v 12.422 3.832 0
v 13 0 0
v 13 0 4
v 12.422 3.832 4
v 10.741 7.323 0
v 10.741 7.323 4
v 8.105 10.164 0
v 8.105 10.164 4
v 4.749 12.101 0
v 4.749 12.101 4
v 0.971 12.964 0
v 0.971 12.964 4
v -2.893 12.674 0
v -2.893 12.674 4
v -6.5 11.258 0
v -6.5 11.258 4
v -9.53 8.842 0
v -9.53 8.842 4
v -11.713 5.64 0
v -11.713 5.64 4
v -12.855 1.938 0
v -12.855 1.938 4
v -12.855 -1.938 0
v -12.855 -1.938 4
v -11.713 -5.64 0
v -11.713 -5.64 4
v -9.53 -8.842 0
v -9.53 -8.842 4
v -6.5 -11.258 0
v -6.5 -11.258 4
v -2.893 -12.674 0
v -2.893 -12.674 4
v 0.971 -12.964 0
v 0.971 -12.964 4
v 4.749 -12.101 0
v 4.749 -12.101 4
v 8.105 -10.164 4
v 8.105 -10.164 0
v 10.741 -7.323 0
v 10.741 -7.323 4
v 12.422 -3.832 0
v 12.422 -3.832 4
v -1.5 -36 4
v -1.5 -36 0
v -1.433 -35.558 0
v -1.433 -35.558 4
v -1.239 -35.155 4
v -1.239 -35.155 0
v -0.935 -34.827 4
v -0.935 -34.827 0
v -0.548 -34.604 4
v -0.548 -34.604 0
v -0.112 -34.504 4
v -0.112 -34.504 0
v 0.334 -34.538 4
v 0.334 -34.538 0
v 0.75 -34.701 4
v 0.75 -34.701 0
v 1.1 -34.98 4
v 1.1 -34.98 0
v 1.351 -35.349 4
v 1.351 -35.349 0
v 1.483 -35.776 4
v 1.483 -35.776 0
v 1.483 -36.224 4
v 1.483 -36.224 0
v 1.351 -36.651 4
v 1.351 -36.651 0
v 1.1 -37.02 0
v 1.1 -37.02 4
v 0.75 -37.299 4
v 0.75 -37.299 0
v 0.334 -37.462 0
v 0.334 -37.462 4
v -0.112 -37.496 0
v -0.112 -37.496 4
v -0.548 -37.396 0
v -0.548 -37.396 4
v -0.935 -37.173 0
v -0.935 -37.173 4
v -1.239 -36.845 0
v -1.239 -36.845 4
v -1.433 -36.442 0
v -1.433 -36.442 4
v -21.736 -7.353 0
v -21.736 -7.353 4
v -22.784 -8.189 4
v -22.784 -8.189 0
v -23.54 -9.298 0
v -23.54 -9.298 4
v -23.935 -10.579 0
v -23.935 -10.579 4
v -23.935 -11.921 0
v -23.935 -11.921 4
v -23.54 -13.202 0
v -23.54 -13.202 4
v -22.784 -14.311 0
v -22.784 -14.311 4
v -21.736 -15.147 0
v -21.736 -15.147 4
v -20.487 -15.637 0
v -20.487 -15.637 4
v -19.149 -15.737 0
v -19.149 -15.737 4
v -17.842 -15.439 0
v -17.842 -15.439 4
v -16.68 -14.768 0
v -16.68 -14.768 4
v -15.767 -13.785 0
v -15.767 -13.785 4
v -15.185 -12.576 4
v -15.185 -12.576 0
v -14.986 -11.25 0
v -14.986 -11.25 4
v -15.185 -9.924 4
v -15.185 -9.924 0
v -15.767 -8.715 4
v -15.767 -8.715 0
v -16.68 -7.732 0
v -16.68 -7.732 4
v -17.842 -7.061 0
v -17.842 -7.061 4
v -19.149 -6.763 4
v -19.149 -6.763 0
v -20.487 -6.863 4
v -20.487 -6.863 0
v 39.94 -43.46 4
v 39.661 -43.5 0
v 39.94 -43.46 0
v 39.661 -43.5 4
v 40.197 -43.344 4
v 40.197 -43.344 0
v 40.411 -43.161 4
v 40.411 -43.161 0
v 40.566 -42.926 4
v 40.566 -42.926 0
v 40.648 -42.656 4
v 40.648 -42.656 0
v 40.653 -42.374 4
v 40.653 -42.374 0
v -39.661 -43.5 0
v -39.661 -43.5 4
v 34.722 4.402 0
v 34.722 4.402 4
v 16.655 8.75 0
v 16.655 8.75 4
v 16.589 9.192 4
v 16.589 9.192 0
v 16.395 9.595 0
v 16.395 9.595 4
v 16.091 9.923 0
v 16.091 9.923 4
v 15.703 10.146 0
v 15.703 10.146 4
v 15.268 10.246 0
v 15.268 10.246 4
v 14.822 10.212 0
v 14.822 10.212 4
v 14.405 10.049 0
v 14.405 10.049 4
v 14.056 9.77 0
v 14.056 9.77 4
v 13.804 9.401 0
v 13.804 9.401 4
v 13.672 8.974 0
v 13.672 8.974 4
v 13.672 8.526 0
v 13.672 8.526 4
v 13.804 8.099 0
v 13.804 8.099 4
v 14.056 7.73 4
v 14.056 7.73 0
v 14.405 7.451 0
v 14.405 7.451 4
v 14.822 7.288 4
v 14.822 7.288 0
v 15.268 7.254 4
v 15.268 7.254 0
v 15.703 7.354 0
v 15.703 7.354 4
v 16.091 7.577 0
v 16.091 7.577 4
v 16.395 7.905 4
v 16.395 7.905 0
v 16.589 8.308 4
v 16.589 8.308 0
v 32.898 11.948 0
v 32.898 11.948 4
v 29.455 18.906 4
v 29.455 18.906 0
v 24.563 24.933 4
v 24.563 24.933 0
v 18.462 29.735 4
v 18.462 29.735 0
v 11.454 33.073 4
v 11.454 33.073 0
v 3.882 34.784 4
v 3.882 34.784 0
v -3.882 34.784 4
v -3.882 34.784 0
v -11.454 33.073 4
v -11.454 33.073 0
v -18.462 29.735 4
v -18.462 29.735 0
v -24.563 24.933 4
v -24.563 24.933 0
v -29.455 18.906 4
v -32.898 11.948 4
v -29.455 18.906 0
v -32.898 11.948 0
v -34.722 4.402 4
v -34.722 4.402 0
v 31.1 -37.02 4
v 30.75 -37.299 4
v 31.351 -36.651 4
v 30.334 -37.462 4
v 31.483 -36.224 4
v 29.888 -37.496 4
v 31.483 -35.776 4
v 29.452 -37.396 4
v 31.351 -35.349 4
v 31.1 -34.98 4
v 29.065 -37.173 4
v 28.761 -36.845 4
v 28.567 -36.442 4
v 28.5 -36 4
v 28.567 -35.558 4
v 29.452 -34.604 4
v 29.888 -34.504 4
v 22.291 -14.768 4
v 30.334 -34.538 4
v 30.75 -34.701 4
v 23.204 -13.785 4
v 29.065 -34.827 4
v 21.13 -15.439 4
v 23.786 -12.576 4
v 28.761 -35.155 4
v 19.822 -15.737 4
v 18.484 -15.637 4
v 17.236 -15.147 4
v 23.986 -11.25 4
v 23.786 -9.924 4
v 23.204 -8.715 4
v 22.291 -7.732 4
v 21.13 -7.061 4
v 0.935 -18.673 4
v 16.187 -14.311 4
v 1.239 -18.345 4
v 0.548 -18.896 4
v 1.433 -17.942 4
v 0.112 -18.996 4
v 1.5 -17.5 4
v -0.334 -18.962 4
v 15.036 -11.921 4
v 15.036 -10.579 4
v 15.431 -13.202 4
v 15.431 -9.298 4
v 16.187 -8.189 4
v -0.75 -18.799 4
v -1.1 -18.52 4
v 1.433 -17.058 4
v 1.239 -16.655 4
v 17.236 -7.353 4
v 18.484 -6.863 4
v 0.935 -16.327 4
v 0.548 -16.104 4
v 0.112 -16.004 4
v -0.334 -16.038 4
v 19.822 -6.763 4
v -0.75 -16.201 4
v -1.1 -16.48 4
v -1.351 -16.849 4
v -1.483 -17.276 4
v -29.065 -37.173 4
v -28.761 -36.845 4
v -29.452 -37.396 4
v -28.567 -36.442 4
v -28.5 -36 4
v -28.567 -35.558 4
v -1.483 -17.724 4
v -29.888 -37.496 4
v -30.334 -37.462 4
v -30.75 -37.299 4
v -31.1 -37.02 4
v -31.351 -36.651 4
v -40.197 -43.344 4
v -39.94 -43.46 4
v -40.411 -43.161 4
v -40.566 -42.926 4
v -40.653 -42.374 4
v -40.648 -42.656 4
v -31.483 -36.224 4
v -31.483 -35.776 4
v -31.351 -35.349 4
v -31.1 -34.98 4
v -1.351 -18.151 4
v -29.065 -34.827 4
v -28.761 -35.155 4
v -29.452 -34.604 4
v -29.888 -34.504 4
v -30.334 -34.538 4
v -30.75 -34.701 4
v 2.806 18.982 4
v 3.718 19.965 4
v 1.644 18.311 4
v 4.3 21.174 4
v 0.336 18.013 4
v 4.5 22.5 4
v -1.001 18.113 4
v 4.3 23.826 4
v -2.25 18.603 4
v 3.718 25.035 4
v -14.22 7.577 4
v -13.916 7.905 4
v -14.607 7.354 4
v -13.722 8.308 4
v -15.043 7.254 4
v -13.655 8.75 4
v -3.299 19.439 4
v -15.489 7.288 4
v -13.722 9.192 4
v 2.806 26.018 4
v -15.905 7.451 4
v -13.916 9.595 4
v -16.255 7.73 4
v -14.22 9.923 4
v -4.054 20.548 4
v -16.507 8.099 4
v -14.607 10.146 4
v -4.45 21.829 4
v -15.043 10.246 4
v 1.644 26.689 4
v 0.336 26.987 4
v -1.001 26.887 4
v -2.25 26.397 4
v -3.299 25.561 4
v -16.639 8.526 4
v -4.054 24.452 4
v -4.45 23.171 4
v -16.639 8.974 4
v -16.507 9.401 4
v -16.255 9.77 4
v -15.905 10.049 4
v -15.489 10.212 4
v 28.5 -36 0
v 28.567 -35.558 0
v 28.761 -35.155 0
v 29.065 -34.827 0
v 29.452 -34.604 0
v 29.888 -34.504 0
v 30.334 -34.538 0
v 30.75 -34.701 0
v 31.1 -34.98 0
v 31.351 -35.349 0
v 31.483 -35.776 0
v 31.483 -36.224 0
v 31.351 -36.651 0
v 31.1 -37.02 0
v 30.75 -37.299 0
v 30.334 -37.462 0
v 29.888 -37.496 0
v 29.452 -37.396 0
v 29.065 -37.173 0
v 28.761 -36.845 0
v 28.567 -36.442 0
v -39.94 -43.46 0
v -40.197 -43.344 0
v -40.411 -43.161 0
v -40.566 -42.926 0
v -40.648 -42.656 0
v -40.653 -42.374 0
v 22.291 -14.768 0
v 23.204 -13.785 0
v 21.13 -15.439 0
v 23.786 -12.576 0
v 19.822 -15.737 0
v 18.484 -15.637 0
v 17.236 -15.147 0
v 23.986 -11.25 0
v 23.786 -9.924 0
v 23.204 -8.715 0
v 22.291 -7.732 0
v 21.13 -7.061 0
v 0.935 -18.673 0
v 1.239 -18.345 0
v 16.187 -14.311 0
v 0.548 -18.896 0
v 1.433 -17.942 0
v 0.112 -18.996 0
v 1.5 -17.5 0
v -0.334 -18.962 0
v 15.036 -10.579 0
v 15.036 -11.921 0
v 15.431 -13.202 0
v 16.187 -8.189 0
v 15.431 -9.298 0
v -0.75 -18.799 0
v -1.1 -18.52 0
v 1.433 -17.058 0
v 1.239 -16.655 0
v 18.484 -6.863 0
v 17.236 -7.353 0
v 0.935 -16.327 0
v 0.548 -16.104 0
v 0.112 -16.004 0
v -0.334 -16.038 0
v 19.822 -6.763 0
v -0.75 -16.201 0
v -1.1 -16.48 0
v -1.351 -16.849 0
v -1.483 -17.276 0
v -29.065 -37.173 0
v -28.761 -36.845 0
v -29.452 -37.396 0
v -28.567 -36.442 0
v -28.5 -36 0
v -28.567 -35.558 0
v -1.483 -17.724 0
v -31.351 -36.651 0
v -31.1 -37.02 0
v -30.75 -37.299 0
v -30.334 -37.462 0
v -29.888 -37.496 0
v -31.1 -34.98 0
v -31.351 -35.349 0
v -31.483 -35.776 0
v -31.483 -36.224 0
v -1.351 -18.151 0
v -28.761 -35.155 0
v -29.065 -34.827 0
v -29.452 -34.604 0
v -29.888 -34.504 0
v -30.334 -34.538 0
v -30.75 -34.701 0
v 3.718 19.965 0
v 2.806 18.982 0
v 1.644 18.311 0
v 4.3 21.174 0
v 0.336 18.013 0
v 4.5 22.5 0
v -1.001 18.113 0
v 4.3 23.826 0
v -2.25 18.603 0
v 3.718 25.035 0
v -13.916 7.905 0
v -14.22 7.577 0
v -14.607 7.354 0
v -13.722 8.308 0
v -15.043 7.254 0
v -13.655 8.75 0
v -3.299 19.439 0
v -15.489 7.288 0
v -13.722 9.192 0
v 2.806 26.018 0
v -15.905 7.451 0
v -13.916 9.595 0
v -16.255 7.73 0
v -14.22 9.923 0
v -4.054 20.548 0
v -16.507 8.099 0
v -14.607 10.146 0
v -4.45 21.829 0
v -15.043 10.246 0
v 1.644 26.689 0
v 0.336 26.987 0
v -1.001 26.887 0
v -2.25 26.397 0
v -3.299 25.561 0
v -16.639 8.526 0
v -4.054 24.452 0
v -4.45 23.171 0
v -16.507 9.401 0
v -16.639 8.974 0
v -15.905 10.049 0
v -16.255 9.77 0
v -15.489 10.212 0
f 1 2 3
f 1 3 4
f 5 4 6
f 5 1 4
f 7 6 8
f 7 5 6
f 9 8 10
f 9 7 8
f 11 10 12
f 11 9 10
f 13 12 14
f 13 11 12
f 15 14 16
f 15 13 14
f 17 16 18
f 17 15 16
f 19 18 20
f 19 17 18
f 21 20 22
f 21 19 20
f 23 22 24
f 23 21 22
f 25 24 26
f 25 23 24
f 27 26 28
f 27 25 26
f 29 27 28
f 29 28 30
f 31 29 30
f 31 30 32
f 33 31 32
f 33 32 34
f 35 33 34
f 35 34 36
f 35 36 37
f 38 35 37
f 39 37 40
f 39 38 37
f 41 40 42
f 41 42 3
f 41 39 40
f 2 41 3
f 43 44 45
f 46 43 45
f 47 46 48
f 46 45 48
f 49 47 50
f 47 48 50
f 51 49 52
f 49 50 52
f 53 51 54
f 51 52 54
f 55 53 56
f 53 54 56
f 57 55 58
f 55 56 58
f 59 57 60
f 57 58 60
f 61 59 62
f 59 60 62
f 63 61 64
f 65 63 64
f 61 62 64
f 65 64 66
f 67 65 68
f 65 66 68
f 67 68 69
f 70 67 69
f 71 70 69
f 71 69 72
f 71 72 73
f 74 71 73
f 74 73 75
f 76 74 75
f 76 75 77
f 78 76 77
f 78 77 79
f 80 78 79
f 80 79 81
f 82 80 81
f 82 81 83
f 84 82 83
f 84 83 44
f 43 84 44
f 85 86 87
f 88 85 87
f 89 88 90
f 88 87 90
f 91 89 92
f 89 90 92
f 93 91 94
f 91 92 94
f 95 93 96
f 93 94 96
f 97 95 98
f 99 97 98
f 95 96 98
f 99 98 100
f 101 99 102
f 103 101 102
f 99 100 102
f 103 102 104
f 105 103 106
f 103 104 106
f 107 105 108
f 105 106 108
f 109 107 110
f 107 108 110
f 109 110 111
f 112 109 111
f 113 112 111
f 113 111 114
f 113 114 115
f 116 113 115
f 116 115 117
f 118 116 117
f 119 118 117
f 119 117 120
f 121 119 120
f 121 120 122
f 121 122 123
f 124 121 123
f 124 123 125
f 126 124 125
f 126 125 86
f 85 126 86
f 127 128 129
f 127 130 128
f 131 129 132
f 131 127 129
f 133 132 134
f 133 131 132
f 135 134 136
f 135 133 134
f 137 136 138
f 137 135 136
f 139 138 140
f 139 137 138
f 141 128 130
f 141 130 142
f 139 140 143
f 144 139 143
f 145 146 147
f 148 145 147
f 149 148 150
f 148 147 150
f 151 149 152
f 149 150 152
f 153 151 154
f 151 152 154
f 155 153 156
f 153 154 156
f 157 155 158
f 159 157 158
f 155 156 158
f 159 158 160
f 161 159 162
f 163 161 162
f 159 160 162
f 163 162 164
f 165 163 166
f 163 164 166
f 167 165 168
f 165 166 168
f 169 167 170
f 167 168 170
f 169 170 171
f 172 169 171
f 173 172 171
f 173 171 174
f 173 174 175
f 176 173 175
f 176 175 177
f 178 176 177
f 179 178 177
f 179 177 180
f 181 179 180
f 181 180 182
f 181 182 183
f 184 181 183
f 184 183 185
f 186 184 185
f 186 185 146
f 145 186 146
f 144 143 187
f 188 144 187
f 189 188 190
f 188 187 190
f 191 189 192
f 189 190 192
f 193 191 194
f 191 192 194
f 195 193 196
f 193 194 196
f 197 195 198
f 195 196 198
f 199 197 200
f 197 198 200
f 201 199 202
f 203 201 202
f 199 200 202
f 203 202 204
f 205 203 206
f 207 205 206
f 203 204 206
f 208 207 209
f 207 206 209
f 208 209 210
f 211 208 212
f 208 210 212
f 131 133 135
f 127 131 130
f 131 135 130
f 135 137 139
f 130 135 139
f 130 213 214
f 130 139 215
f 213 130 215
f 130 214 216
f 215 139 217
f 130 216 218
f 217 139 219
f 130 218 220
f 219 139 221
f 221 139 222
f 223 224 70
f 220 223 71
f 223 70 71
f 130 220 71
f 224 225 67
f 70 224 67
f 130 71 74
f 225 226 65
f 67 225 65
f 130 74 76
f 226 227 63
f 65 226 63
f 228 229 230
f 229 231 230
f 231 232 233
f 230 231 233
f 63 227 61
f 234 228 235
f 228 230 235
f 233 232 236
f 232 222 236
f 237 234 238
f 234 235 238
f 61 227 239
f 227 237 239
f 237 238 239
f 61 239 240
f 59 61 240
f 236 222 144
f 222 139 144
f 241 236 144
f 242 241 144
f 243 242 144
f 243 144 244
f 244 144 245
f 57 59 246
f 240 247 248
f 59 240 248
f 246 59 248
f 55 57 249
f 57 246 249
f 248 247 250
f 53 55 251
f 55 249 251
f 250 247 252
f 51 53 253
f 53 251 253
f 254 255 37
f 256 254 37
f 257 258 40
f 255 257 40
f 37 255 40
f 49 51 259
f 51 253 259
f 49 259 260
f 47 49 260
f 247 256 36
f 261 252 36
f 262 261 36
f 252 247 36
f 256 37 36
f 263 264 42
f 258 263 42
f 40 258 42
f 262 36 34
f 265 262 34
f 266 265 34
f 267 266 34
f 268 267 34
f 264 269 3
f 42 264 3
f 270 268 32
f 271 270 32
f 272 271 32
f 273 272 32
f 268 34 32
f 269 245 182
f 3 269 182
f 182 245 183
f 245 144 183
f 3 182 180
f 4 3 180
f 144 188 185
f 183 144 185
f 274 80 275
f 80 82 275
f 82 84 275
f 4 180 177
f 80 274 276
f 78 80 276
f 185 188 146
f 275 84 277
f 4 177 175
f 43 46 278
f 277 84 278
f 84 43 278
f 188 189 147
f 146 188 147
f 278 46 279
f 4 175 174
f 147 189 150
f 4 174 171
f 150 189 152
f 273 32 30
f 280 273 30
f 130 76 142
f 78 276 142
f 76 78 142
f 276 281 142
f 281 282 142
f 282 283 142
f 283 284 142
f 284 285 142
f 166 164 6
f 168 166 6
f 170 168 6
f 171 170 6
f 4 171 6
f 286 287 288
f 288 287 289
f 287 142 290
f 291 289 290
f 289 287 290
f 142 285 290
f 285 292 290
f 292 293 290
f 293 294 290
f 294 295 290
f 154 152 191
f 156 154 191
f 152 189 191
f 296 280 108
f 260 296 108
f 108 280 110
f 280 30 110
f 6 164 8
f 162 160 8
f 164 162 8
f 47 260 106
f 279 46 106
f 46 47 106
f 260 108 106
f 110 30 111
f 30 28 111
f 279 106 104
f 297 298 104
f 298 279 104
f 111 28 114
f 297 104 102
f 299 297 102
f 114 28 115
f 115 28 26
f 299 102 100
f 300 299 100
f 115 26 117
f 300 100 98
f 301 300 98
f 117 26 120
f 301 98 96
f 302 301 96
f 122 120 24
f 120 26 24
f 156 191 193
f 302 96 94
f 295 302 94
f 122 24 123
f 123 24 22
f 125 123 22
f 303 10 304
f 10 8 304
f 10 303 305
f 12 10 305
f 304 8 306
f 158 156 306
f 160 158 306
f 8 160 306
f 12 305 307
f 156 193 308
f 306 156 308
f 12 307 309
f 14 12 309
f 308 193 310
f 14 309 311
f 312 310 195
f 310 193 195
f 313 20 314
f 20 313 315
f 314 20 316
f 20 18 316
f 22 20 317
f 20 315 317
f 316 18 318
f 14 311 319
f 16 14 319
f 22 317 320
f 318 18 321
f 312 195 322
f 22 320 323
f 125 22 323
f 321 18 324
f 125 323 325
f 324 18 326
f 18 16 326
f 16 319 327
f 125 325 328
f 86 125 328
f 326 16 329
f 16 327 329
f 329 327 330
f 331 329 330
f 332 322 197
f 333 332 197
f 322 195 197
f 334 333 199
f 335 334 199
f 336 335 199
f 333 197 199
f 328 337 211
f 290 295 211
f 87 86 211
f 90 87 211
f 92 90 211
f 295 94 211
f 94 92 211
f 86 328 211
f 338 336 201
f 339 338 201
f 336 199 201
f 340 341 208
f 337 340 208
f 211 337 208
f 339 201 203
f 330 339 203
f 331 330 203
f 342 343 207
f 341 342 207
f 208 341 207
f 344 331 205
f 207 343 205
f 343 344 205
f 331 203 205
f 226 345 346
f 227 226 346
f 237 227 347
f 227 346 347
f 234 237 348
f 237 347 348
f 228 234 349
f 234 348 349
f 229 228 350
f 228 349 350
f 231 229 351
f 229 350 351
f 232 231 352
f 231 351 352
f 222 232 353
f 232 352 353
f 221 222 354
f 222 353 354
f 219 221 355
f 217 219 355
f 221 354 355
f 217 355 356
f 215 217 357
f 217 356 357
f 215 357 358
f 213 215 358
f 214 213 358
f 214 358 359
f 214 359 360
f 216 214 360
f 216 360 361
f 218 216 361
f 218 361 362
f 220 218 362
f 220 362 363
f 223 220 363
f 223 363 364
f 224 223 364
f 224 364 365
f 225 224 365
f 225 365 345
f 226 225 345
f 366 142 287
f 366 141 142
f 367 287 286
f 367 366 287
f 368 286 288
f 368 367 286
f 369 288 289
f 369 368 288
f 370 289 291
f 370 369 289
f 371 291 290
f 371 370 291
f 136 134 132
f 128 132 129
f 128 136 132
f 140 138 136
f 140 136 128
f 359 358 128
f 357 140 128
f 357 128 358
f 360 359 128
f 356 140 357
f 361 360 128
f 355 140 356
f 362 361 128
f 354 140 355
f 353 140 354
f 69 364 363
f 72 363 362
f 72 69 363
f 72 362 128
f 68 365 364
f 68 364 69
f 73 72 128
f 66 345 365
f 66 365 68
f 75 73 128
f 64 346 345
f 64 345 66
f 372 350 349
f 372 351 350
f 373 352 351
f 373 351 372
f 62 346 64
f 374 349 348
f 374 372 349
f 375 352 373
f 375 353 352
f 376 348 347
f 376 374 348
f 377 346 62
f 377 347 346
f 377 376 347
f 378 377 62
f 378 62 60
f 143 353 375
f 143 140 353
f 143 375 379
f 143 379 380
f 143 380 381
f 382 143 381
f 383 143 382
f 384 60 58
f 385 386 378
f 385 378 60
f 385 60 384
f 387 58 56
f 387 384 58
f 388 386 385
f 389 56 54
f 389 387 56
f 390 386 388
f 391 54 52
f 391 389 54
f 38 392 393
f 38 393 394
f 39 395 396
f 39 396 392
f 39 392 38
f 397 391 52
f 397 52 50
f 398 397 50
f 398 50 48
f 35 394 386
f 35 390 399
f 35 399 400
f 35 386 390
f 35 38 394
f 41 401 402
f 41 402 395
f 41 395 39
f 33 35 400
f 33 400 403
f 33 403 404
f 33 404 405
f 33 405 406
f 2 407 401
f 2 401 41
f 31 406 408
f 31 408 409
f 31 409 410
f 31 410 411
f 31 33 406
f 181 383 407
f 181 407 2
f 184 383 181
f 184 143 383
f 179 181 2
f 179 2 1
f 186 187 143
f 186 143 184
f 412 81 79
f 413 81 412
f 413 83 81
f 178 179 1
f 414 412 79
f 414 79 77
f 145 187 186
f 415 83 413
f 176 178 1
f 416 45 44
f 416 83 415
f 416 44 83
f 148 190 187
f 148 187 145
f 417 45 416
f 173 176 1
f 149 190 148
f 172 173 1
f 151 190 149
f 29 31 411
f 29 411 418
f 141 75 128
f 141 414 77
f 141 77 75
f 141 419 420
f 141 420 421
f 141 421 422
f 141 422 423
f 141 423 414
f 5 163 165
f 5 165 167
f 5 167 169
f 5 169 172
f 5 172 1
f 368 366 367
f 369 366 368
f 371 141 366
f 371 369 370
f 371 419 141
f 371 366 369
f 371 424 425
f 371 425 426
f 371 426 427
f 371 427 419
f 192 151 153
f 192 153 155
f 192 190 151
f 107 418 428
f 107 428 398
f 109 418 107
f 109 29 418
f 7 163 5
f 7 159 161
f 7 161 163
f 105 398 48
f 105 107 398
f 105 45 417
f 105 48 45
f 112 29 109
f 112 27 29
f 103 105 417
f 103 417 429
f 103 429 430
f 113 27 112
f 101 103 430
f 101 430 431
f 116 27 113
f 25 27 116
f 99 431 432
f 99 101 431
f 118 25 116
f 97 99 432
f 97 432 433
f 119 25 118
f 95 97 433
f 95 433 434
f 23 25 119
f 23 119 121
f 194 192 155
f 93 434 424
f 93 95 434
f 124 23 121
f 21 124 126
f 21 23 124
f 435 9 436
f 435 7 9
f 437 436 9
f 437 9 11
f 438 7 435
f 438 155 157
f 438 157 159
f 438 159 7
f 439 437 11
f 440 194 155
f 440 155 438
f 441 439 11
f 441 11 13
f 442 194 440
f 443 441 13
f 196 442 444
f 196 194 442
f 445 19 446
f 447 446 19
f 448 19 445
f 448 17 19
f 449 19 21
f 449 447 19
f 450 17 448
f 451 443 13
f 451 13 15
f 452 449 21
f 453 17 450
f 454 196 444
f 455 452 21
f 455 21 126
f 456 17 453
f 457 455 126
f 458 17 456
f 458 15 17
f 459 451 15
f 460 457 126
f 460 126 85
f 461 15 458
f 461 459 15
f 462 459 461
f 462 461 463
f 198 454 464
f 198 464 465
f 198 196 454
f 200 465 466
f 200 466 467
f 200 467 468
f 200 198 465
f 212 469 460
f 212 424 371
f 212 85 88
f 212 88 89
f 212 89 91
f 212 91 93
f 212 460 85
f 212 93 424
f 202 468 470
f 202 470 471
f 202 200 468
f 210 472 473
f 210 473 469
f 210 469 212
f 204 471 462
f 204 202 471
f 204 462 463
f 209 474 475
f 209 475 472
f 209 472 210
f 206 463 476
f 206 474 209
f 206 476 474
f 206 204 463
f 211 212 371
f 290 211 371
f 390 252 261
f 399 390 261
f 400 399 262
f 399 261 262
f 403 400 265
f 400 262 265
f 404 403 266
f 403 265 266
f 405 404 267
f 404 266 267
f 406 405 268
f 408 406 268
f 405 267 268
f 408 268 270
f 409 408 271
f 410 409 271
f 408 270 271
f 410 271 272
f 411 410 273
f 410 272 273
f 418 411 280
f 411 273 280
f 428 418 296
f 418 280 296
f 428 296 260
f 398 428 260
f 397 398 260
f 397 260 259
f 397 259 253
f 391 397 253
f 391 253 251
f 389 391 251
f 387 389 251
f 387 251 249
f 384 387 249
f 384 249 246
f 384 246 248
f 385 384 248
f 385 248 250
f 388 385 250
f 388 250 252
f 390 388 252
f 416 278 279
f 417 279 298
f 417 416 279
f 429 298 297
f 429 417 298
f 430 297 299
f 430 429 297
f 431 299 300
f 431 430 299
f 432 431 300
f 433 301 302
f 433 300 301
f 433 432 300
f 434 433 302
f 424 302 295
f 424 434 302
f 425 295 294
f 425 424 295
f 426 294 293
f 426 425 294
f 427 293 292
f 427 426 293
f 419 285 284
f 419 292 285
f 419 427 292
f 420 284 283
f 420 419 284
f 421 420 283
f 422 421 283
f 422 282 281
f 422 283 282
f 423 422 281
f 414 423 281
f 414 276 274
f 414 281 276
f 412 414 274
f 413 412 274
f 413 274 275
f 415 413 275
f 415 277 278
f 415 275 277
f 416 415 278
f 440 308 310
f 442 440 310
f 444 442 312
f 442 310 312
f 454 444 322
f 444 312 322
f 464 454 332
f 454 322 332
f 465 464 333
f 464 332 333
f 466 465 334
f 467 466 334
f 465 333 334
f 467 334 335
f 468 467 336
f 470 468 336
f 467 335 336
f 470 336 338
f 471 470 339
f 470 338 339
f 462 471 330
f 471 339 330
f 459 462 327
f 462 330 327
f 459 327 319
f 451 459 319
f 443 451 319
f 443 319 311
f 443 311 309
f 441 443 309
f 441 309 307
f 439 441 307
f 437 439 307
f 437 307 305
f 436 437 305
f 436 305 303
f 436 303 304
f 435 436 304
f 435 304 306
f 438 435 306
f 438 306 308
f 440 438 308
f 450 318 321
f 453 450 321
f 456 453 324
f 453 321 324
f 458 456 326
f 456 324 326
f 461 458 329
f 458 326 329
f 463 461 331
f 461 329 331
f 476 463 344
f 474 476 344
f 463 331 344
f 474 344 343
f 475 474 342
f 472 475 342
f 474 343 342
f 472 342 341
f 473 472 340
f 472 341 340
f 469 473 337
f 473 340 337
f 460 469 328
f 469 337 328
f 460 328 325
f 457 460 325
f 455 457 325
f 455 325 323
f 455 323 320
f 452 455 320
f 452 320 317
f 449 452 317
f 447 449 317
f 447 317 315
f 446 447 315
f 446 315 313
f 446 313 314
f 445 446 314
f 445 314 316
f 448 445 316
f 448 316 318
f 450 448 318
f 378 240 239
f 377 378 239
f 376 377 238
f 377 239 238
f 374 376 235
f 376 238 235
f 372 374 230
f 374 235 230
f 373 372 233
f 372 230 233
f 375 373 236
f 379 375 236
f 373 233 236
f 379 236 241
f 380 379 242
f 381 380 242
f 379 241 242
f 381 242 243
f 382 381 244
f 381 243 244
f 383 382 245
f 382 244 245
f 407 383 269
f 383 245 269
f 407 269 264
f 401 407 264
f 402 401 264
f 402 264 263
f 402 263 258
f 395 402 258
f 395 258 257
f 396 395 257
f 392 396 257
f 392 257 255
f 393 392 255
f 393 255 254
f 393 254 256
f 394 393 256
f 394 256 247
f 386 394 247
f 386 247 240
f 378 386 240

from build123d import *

# Parameters (mm, degrees)
SKETCH_1_R               = 13
EXTRUDE_1_DEPTH          = 4
SKETCH_2_W               = 84
SKETCH_2_H               = 62
EXTRUDE_2_DEPTH          = 4
SKETCH_3_R               = 4.5
CUT_EXTRUDE_1_DEPTH      = 10
SKETCH_4_R               = 1.5
CUT_EXTRUDE_2_DEPTH      = 123.494897853
SKETCH_8_W               = 18
SKETCH_8_H               = 44
EXTRUDE_4_DEPTH          = 4
SKETCH_9_W               = 64
SKETCH_9_H               = 22
CUT_EXTRUDE_6_DEPTH      = 130.772878522
SKETCH_10_R              = 1.5
CUT_EXTRUDE_7_DEPTH      = 130.772878522
SKETCH_11_R              = 1.5
CUT_EXTRUDE_8_DEPTH      = 130.772878522
SKETCH_12_R              = 1.5
CUT_EXTRUDE_9_DEPTH      = 130.772878522
FILLET_1_R               = 3
SKETCH_13_W              = 20
SKETCH_13_H              = 18
CUT_EXTRUDE_10_DEPTH     = 130.772878522
FILLET_2_R               = 3
PATTERN_CIRCULAR_1_COUNT = 3
SKETCH_15_W              = 125.49724571
SKETCH_15_H              = 54.116042209
CUT_EXTRUDE_11_DEPTH     = 130.772878522
FILLET_3_R               = 3
SKETCH_16_R              = 1.5
CUT_EXTRUDE_12_DEPTH     = 97.13012015
SKETCH_17_W              = 168.959633348
SKETCH_17_H              = 62.358711946
CUT_EXTRUDE_13_DEPTH     = 97.13012015
FILLET_4_R               = 1


with BuildPart() as part:
    # 草图1 → 凸台-拉伸1 (new body)
    with BuildSketch(Plane.XY):
        with BuildLine():
            ThreePointArc((34.722027765, 4.402361625), (0, 35), (-34.722027765, 4.402361625))
            Line((-34.722027765, 4.402361625), (-42, -53))
            Line((-42, -53), (42, -53))
            Line((42, -53), (34.722027765, 4.402361625))
        make_face()
        Circle(SKETCH_1_R, mode=Mode.SUBTRACT)
    extrude(amount=EXTRUDE_1_DEPTH)

    # 草图2 → 凸台-拉伸2 (add)
    with BuildSketch(Plane.XY.offset(4)):
        with Locations((0, -84)):
            Rectangle(SKETCH_2_W, SKETCH_2_H)
    extrude(amount=-EXTRUDE_2_DEPTH)

    # 草图3 → 切除-拉伸1 (cut)
    with BuildSketch(Plane.XY.offset(4)):
        with Locations((0, 22.5)):
            Circle(SKETCH_3_R)
    cut_extrude_1 = extrude(amount=-CUT_EXTRUDE_1_DEPTH, mode=Mode.SUBTRACT)

    # 草图4 → 切除-拉伸2 (cut, through all)
    with BuildSketch(Plane.XY.offset(4)):
        with Locations((15.155444566, 8.75)):
            Circle(SKETCH_4_R)
        with Locations((0, -17.5)):
            Circle(SKETCH_4_R)
        with Locations((-15.155444566, 8.75)):
            Circle(SKETCH_4_R)
    extrude(amount=-CUT_EXTRUDE_2_DEPTH, mode=Mode.SUBTRACT)

    # 草图8 → 凸台-拉伸4 (add)
    with BuildSketch(Plane.XY.offset(4)):
        with Locations((-51, -75)):
            Rectangle(SKETCH_8_W, SKETCH_8_H)
    extrude_4 = extrude(amount=-EXTRUDE_4_DEPTH)

    # 镜向3: 凸台-拉伸4 across plane
    add(extrude_4.mirror(Plane(origin=(0, 0, 0), x_dir=(0, 0, 1), z_dir=(1, 0, 0))))

    # 草图9 → 切除-拉伸6 (cut, through all)
    with BuildSketch(Plane(origin=(0, 0, 0), x_dir=(-1, 0, 0), z_dir=(0, 0, -1))):
        with Locations((0, -76)):
            Rectangle(SKETCH_9_W, SKETCH_9_H)
    extrude(amount=-CUT_EXTRUDE_6_DEPTH, mode=Mode.SUBTRACT)

    # 草图10 → 切除-拉伸7 (cut, through all)
    with BuildSketch(Plane(origin=(0, 0, 0), x_dir=(-1, 0, 0), z_dir=(0, 0, -1))):
        with Locations((0, -107.5)):
            Circle(SKETCH_10_R)
        with Locations((24, -107.5)):
            Circle(SKETCH_10_R)
    cut_extrude_7 = extrude(amount=-CUT_EXTRUDE_7_DEPTH, mode=Mode.SUBTRACT)

    # 镜向4: 切除-拉伸7 across plane
    add(cut_extrude_7.mirror(Plane(origin=(0, 0, 0), x_dir=(0, 0, 1), z_dir=(1, 0, 0))), mode=Mode.SUBTRACT)

    # 草图11 → 切除-拉伸8 (cut, through all)
    with BuildSketch(Plane(origin=(0, 0, 0), x_dir=(-1, 0, 0), z_dir=(0, 0, -1))):
        with Locations((-52.5, -67.5)):
            Circle(SKETCH_11_R)
        with Locations((-52.5, -90)):
            Circle(SKETCH_11_R)
    cut_extrude_8 = extrude(amount=-CUT_EXTRUDE_8_DEPTH, mode=Mode.SUBTRACT)

    # 镜向5: 切除-拉伸8 across plane
    add(cut_extrude_8.mirror(Plane(origin=(0, 0, 0), x_dir=(0, 0, 1), z_dir=(1, 0, 0))), mode=Mode.SUBTRACT)

    # 草图12 → 切除-拉伸9 (cut, through all)
    with BuildSketch(Plane(origin=(0, 0, 0), x_dir=(-1, 0, 0), z_dir=(0, 0, -1))):
        with Locations((-30, -36)):
            Circle(SKETCH_12_R)
    cut_extrude_9 = extrude(amount=-CUT_EXTRUDE_9_DEPTH, mode=Mode.SUBTRACT)

    # 镜向6: 切除-拉伸9 across plane
    add(cut_extrude_9.mirror(Plane(origin=(0, 0, 0), x_dir=(0, 0, 1), z_dir=(1, 0, 0))), mode=Mode.SUBTRACT)

    # 圆角1
    fillet_1_edges = [part.edges().sort_by_distance(p)[0] for p in [
        (42, -53, 2),
        (-42, -53, 2),
        (-42, -97, 2),
        (42, -97, 2),
        (-32, -65, 2),
        (-32, -87, 2),
        (32, -87, 2),
        (32, -65, 2),
    ]]
    fillet(fillet_1_edges, radius=FILLET_1_R)

    # 草图13 → 切除-拉伸10 (cut, through all)
    with BuildSketch(Plane(origin=(0, 0, 0), x_dir=(-1, 0, 0), z_dir=(0, 0, -1))):
        with Locations((50, -106)):
            Rectangle(SKETCH_13_W, SKETCH_13_H)
    cut_extrude_10 = extrude(amount=-CUT_EXTRUDE_10_DEPTH, mode=Mode.SUBTRACT)

    # 镜向7: 切除-拉伸10 across plane
    add(cut_extrude_10.mirror(Plane(origin=(0, 0, 0), x_dir=(0, 0, 1), z_dir=(1, 0, 0))), mode=Mode.SUBTRACT)

    # 圆角2
    fillet_2_edges = [part.edges().sort_by_distance(p)[0] for p in [
        (-40, -97, 2),
        (40, -97, 2),
    ]]
    fillet(fillet_2_edges, radius=FILLET_2_R)

    # 阵列(圆周)1: 切除-拉伸1 ×3 about axis
    pattern_circular_1_axis = Axis((0, 0, 0), (0, 0, 1))
    for i in range(1, PATTERN_CIRCULAR_1_COUNT):
        add(cut_extrude_1.rotate(pattern_circular_1_axis, i * 360 / PATTERN_CIRCULAR_1_COUNT), mode=Mode.SUBTRACT)

    # 草图15 → 切除-拉伸11 (cut, through all)
    with BuildSketch(Plane.XY.offset(4)):
        with Locations((2.748622855, -102.058021104)):
            Rectangle(SKETCH_15_W, SKETCH_15_H)
    extrude(amount=-CUT_EXTRUDE_11_DEPTH, mode=Mode.SUBTRACT)

    # 圆角3
    fillet_3_edges = [part.edges().sort_by_distance(p)[0] for p in [
        (32, -75, 2),
        (-32, -75, 2),
    ]]
    fillet(fillet_3_edges, radius=FILLET_3_R)

    # 草图16 → 切除-拉伸12 (cut, through all)
    with BuildSketch(Plane(origin=(0, 0, 0), x_dir=(-1, 0, 0), z_dir=(0, 0, -1))):
        with Locations((0, -36)):
            Circle(SKETCH_16_R)
    extrude(amount=-CUT_EXTRUDE_12_DEPTH, mode=Mode.SUBTRACT)

    # 草图17 → 切除-拉伸13 (cut, through all)
    with BuildSketch(Plane(origin=(0, 0, 0), x_dir=(-1, 0, 0), z_dir=(0, 0, -1))):
        with Locations((4.236961123, -74.679355973)):
            Rectangle(SKETCH_17_W, SKETCH_17_H)
    extrude(amount=-CUT_EXTRUDE_13_DEPTH, mode=Mode.SUBTRACT)

    # 圆角4
    fillet_4_edges = [part.edges().sort_by_distance(p)[0] for p in [
        (40.795507114, -43.5, 2),
        (-40.795507114, -43.5, 2),
    ]]
    fillet(fillet_4_edges, radius=FILLET_4_R)


solid = part.part
